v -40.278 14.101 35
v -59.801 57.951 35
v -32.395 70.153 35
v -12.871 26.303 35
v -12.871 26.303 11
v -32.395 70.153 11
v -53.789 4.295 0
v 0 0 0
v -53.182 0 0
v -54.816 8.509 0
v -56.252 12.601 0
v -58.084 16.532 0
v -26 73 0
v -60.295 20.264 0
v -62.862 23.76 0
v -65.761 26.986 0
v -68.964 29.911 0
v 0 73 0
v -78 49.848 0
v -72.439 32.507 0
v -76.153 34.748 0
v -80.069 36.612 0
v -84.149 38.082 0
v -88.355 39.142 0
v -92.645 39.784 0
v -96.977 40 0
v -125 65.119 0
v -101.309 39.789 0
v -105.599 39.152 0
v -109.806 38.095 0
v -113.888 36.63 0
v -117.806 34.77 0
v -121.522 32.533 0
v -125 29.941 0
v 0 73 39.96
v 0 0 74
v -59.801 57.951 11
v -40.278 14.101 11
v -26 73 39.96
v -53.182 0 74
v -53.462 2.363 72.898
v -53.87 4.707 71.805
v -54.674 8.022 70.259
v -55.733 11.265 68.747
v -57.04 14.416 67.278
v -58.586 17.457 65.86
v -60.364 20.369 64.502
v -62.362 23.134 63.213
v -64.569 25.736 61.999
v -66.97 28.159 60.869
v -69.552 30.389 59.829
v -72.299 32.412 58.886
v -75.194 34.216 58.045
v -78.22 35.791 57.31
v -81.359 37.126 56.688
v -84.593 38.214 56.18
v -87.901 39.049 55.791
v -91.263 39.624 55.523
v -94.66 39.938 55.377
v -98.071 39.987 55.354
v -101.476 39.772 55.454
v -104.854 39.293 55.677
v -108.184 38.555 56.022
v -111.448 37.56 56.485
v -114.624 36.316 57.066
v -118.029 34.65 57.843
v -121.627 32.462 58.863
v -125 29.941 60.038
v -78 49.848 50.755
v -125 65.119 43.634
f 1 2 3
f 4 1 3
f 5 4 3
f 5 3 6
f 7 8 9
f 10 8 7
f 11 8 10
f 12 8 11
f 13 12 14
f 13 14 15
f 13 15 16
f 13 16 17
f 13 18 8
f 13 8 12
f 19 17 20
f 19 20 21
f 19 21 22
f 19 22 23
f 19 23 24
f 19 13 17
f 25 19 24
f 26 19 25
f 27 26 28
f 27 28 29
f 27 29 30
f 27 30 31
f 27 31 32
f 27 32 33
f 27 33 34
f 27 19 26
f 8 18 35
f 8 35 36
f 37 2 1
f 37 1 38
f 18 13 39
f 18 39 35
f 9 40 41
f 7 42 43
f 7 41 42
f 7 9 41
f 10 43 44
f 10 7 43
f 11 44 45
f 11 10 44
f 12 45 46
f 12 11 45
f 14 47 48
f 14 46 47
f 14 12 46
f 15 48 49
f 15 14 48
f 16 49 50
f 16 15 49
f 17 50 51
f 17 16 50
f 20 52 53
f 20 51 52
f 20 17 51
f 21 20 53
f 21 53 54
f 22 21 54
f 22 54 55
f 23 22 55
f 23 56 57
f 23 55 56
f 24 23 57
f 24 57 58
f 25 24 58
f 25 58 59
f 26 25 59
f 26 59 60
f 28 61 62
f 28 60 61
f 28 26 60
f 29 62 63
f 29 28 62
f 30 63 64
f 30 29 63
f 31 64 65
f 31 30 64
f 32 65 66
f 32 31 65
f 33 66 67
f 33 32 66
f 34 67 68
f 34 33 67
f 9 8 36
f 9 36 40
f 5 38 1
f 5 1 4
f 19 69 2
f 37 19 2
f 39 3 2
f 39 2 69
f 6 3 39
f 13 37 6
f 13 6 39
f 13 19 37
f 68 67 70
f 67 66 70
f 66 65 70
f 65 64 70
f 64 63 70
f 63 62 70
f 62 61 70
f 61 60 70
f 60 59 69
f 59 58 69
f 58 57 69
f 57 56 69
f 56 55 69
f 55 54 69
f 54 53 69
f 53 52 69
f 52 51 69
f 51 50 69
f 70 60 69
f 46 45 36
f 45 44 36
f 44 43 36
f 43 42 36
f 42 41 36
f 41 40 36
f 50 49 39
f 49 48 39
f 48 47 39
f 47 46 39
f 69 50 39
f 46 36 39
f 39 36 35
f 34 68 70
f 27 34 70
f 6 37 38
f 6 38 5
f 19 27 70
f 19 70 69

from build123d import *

# Parameters (mm, degrees)
BOSS_EXTRUDE1_DEPTH = 74
CUT_EXTRUDE1_DEPTH  = 126
SKETCH3_W           = 30
SKETCH3_H           = 24
CUT_EXTRUDE2_DEPTH  = 48


with BuildPart() as part:
    # Sketch1 → Boss-Extrude1 (new body)
    with BuildSketch(Plane.XY):
        with BuildLine():
            Line((0, 0), (-53.1821954, 0))
            ThreePointArc((-53.1821954, 0), (-80.068712849, 36.611962713), (-125, 29.941125497))
            Line((-125, 29.941125497), (-125, 65.119334087))
            Line((-125, 65.119334087), (-78, 49.848108364))
            Line((-78, 49.848108364), (-26, 73))
            Line((-26, 73), (0, 73))
            Line((0, 73), (0, 0))
        make_face()
    extrude(amount=BOSS_EXTRUDE1_DEPTH)

    # Sketch2 → Cut-Extrude1 (cut, through all)
    with BuildSketch(Plane(origin=(0, 0, 0), x_dir=(0, 0, -1), z_dir=(1, 0, 0))):
        Polygon((-74, 0), (-39.959540955, 73), (-74, 73), align=None)
    extrude(amount=-CUT_EXTRUDE1_DEPTH, mode=Mode.SUBTRACT)

    # Sketch3 → Cut-Extrude2 (cut)
    with BuildSketch(Plane(origin=(-31.426088247, 70.584149863, 0), x_dir=(0.913545458, 0.406736643, 0), z_dir=(-0.406736643, 0.913545458, 0))):
        with Locations((-16.060406954, -23)):
            Rectangle(SKETCH3_W, SKETCH3_H)
    extrude(amount=-CUT_EXTRUDE2_DEPTH, mode=Mode.SUBTRACT)


solid = part.part
